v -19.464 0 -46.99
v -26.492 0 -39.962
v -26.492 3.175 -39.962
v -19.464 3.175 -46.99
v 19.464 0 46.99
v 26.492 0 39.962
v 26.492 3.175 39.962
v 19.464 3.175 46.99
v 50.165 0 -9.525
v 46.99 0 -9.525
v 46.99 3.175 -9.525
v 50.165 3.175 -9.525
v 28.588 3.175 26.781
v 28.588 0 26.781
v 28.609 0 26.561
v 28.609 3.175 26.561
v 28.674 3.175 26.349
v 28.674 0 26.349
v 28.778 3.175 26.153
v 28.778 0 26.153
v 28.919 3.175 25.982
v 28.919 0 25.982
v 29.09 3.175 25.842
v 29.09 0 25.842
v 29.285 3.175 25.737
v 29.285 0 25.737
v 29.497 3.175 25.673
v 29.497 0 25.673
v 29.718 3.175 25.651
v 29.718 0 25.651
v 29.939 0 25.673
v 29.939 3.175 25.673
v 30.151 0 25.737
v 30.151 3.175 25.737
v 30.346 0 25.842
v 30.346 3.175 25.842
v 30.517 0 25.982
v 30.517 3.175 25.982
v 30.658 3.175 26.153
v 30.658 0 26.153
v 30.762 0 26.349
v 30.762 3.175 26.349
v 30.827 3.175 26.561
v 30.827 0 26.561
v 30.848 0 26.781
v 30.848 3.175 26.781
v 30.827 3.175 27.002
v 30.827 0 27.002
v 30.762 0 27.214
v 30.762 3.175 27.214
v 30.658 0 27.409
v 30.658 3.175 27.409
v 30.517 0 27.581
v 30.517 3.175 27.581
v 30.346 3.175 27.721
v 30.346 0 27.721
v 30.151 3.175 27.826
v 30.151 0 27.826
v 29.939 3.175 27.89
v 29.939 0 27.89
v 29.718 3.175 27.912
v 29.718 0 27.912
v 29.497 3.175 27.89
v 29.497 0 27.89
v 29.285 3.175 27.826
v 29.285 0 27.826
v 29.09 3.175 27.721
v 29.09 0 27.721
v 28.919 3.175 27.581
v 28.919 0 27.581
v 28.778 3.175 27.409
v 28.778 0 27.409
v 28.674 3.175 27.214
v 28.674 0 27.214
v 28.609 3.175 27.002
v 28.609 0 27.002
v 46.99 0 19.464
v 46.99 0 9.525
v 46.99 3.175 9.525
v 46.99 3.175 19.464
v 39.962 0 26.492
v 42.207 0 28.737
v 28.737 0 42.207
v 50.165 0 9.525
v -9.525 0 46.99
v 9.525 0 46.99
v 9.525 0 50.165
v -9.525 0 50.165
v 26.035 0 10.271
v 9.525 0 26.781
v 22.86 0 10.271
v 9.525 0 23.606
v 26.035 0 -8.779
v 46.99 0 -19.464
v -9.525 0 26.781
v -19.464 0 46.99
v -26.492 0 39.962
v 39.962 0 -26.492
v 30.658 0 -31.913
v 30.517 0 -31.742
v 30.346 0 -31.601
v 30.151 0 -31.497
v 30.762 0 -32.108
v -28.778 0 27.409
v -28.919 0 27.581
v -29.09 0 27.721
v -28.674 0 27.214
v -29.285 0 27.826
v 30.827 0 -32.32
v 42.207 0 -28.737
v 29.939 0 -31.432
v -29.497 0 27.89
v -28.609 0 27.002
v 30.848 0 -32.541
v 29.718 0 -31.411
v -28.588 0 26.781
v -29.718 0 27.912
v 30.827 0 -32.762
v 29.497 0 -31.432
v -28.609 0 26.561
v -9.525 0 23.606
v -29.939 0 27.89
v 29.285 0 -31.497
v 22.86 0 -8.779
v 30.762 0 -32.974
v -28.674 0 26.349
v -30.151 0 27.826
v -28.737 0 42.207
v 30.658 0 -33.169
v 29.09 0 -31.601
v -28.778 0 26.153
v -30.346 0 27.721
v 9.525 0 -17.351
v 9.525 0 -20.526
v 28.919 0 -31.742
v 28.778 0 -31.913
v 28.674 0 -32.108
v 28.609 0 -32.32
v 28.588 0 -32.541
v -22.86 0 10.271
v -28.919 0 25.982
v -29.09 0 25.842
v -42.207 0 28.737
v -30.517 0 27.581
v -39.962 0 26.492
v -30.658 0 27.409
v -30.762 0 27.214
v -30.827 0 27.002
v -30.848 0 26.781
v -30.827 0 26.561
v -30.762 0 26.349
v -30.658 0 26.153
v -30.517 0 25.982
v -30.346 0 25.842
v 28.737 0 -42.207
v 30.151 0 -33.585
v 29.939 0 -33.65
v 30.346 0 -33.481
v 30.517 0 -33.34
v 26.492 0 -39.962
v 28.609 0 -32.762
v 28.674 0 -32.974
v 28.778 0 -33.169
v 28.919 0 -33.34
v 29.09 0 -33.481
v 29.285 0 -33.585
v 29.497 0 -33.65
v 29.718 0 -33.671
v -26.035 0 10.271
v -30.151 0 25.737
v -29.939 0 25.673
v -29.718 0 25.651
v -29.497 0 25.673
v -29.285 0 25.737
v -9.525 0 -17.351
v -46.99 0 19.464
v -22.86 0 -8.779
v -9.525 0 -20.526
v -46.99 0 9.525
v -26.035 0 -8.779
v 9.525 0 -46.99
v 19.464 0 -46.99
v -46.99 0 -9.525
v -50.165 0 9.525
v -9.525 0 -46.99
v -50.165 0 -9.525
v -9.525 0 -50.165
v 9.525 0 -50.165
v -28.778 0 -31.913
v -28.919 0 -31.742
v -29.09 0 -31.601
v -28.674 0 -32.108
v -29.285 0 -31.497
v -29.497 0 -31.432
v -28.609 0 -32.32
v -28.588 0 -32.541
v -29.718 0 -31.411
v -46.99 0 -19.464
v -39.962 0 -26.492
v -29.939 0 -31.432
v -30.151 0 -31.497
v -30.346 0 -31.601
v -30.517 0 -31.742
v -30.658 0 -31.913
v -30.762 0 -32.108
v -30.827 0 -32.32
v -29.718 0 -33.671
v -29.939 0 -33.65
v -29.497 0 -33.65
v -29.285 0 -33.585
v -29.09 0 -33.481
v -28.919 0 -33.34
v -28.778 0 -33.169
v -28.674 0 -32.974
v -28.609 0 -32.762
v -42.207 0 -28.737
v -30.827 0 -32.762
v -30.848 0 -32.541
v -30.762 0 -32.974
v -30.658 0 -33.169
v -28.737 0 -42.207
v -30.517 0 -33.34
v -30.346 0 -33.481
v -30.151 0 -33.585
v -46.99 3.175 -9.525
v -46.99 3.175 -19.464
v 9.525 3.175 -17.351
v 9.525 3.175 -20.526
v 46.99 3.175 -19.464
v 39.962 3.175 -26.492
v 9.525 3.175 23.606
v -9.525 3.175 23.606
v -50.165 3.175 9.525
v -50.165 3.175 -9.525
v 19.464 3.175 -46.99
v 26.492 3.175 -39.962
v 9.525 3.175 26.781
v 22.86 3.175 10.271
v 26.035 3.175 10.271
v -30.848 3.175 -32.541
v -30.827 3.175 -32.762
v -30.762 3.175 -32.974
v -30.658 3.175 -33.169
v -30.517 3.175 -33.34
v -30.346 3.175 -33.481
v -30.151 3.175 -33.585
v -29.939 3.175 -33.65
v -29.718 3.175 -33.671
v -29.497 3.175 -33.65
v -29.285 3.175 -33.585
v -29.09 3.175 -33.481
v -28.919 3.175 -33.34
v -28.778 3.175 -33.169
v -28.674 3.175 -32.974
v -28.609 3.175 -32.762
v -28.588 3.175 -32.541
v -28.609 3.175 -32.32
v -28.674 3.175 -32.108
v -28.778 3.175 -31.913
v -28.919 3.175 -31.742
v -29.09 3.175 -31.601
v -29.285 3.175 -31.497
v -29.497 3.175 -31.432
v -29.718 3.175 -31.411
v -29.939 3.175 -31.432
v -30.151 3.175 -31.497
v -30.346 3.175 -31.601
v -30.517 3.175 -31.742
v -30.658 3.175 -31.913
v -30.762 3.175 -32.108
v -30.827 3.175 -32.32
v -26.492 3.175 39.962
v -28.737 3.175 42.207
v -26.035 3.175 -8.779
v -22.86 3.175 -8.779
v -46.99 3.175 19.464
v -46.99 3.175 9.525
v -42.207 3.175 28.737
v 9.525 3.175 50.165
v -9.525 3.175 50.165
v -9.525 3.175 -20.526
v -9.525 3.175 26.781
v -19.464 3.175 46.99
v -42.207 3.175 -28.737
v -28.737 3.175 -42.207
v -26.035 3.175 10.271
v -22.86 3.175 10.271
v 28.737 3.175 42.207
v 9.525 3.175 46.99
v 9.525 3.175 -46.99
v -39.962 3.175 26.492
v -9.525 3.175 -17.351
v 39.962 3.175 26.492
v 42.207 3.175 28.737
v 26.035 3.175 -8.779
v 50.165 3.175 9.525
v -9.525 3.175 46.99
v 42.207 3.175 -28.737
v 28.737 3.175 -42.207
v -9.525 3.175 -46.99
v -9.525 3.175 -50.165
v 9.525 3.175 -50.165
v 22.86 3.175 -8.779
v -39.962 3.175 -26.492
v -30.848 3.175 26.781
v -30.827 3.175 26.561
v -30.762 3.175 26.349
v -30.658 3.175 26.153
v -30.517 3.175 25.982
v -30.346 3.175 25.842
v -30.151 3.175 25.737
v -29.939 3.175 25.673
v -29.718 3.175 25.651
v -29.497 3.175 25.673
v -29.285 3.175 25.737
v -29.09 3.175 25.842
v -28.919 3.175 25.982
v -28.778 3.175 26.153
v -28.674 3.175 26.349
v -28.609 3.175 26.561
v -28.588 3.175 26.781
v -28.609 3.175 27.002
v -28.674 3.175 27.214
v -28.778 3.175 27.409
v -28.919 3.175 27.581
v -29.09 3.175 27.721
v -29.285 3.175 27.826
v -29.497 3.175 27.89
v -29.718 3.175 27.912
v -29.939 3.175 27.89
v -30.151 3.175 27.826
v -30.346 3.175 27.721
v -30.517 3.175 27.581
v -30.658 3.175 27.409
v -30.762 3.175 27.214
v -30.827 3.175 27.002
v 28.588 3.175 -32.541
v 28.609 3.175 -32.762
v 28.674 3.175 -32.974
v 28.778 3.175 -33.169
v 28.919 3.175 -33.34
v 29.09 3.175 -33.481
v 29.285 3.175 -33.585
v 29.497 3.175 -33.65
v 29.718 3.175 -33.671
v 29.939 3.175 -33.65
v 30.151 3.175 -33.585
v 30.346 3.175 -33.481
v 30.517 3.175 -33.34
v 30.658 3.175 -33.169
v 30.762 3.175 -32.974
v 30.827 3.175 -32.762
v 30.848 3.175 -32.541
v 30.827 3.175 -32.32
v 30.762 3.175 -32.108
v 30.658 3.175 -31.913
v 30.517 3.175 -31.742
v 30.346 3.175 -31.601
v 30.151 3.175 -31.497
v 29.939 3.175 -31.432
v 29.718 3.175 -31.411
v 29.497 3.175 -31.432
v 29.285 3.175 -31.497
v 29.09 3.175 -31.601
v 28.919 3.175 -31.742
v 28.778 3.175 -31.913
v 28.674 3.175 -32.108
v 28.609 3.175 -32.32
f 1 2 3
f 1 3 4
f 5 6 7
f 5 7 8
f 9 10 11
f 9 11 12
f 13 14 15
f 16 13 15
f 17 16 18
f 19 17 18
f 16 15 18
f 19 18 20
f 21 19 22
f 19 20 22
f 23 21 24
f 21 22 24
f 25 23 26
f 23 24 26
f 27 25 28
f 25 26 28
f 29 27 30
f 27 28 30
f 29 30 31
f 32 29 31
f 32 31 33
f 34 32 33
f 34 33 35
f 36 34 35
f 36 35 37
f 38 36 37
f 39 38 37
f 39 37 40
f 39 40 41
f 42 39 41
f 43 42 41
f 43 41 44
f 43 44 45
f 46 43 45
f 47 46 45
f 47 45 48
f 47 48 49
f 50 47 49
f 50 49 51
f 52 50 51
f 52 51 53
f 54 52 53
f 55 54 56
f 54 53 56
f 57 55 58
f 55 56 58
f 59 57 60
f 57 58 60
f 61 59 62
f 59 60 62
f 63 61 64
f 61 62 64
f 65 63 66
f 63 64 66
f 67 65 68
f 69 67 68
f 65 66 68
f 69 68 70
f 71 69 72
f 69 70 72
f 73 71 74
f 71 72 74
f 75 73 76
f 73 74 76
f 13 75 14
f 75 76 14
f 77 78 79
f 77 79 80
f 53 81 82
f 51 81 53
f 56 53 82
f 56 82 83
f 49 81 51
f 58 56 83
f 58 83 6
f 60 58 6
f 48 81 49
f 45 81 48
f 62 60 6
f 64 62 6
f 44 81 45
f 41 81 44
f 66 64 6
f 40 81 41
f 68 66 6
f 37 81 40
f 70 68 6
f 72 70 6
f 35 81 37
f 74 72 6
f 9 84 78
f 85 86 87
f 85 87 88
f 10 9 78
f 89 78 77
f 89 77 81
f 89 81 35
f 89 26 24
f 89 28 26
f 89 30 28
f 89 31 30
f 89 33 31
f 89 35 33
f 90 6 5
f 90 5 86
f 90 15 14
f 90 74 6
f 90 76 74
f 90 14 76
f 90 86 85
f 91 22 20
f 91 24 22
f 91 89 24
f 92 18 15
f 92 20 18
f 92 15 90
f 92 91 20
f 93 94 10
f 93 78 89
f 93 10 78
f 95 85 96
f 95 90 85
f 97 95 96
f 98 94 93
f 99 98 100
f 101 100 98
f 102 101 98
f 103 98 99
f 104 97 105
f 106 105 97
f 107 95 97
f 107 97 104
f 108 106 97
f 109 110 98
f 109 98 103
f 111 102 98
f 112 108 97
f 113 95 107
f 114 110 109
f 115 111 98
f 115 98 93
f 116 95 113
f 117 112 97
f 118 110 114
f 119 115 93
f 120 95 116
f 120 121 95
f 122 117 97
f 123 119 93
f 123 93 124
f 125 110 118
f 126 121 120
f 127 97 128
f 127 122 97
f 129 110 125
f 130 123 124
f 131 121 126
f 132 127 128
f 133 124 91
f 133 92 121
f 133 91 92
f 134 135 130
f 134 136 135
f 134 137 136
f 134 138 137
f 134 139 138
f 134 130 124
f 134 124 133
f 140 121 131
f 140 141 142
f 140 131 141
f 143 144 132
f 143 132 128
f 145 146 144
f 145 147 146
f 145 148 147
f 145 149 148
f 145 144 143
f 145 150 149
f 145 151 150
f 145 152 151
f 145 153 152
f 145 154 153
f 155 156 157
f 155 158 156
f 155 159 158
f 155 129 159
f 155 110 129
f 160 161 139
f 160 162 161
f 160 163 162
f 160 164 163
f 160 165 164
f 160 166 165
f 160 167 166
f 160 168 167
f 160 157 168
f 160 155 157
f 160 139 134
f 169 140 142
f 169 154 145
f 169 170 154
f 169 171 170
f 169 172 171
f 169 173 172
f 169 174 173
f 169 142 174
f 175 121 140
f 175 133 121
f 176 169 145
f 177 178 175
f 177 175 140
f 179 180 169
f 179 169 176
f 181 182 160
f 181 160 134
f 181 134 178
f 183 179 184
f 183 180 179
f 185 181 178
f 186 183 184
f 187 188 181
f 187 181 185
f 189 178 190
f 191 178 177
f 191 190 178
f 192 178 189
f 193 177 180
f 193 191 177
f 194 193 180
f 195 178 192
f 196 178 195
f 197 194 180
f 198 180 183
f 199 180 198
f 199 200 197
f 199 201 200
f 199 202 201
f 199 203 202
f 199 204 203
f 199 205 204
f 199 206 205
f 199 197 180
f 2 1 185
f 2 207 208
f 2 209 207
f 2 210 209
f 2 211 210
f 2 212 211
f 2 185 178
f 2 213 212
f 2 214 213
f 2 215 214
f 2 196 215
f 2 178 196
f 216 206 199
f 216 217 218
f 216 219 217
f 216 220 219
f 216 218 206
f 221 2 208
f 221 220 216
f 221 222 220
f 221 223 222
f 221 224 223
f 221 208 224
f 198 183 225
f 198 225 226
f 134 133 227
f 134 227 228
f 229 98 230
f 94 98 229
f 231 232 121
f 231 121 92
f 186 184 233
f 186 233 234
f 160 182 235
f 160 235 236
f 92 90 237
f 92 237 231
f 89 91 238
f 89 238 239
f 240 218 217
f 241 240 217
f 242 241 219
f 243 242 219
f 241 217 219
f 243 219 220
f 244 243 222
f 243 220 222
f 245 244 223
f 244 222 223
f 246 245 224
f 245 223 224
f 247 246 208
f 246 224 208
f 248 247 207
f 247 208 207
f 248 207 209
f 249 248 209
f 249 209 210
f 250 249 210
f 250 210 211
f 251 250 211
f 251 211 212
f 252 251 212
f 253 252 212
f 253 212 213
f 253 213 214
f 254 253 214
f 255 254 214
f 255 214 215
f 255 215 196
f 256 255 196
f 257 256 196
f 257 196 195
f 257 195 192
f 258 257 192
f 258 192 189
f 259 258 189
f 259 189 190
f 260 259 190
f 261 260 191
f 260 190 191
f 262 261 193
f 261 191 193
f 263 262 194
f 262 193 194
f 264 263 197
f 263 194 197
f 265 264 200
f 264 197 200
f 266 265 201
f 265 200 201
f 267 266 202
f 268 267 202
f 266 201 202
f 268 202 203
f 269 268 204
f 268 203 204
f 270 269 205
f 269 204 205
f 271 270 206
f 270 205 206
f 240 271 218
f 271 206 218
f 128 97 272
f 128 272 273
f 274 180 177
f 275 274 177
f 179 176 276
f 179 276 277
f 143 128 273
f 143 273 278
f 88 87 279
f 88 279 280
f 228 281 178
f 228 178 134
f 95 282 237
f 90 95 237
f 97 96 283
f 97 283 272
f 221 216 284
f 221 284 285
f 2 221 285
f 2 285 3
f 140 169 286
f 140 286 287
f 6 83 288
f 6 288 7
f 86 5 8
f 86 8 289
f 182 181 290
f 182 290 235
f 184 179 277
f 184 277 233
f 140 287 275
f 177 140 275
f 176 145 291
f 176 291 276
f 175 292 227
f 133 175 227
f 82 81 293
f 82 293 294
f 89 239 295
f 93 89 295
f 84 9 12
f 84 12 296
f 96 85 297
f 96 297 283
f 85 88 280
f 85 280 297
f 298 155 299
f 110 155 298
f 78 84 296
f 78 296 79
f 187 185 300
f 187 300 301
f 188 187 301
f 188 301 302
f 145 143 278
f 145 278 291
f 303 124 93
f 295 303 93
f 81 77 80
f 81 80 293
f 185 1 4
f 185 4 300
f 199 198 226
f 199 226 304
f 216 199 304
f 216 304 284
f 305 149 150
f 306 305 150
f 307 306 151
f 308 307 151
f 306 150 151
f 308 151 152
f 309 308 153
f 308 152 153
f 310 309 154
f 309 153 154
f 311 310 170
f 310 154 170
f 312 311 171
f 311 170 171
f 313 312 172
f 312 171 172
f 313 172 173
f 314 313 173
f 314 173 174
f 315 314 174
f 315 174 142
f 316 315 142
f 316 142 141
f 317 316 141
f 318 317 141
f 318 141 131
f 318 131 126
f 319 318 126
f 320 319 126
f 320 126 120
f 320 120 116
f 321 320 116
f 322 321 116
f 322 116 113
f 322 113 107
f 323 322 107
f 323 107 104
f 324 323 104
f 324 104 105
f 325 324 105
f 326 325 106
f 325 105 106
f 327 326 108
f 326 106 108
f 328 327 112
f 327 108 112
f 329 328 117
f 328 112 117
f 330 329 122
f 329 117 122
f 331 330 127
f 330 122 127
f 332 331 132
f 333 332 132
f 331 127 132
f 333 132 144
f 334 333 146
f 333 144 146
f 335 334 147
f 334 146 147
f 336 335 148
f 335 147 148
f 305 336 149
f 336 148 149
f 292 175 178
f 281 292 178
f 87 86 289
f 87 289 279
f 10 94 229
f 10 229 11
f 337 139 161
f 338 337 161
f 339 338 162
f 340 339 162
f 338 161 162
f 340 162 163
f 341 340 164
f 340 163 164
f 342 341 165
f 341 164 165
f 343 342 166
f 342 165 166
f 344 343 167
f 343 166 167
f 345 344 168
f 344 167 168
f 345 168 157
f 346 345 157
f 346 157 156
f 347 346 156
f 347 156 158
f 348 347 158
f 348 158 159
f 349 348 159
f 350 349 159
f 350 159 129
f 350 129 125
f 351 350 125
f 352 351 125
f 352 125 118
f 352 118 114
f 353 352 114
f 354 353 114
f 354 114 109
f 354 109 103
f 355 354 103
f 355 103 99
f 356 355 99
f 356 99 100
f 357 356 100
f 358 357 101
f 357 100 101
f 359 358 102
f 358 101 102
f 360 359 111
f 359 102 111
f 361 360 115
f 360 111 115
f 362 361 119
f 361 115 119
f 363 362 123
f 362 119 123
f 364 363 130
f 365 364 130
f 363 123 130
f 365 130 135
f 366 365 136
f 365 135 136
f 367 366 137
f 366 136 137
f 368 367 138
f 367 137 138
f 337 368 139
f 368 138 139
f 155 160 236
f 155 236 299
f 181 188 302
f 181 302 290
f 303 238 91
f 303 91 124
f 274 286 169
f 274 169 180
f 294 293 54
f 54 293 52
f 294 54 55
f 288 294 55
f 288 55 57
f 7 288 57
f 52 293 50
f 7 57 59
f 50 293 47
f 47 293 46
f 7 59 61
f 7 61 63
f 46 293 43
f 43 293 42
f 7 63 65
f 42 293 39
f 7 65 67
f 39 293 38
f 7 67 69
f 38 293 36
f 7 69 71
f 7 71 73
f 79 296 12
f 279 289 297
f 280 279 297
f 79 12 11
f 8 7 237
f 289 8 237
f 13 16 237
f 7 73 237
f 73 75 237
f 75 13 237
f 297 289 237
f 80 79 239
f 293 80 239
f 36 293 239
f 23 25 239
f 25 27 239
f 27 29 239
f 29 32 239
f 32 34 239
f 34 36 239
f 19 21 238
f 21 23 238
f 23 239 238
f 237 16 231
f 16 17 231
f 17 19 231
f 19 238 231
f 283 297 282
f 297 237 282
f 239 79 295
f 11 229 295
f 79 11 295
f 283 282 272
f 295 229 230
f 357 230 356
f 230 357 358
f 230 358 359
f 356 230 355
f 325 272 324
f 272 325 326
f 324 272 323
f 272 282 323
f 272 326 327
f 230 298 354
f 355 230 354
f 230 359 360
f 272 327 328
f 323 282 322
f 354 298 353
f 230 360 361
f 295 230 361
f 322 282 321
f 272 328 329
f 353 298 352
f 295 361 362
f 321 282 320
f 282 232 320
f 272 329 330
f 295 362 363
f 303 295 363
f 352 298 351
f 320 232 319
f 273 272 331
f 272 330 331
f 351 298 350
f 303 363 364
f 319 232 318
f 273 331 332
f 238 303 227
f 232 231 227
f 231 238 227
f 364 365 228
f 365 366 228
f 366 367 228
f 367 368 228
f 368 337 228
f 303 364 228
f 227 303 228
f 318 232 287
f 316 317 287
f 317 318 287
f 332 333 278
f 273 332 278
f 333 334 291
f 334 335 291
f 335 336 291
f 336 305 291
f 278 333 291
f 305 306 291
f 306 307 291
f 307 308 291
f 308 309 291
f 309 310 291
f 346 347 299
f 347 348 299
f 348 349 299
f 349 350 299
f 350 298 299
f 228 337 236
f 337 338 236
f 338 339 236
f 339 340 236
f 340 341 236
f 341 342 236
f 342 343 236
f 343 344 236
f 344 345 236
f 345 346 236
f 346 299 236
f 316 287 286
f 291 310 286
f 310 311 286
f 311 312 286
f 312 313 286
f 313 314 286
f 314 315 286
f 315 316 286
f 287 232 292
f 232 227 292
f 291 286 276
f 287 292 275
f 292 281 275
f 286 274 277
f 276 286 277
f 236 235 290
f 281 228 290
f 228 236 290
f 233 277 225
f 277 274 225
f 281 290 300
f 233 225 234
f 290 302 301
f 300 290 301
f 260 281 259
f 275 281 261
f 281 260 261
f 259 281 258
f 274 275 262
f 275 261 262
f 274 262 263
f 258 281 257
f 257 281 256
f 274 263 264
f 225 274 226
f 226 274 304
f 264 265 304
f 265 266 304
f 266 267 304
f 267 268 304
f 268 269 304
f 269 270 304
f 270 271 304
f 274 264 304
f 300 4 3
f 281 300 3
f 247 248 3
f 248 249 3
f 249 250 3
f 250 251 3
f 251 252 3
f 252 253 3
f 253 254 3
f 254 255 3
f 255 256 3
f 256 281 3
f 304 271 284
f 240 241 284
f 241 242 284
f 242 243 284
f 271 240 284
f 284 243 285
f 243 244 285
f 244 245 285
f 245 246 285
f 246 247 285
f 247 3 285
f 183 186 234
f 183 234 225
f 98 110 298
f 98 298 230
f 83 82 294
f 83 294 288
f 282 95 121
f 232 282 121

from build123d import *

# Parameters (mm, degrees)
BOSS_EXTRUDE1_DEPTH   = 3.175
F_2_CLEARANCE_HOLE1_D = 2.2606
SKETCH4_W             = 3.175
SKETCH4_H             = 19.05
SKETCH4_W_2           = 19.05
SKETCH4_H_2           = 3.175
CUT_EXTRUDE1_DEPTH    = 72.01498393


with BuildPart() as part:
    # Sketch1 → Boss-Extrude1 (new body)
    with BuildSketch(Plane(origin=(0, 0, 0), x_dir=(1, 0, 0), z_dir=(0, 1, 0))):
        Polygon((-19.463895296, 46.99), (-9.525027315, 46.99), (-9.525027315, 50.165), (9.524972685, 50.165), (9.524972685, 46.990031352), (19.463840666, 46.990031352), (26.491681613, 39.962190405), (28.736745643, 42.207254435), (42.207129825, 28.736870254), (39.962087963, 26.491828392), (46.98992891, 19.463987446), (46.98992891, 9.525119465), (50.16492891, 9.525119465), (50.16492891, -9.524880535), (46.989960262, -9.524880535), (46.989960262, -19.463748516), (39.962119315, -26.491589463), (42.207183345, -28.736653493), (28.736799164, -42.207037675), (26.491757302, -39.961995814), (19.463916356, -46.98983676), (9.525048375, -46.98983676), (9.525048375, -50.16483676), (-9.524951625, -50.16483676), (-9.524951625, -46.989868112), (-19.463819606, -46.989868112), (-26.491660553, -39.962027165), (-28.736724583, -42.207091196), (-42.207108765, -28.736707014), (-39.962066904, -26.491665153), (-46.98990785, -19.463824206), (-46.98990785, -9.524956225), (-50.16490785, -9.524956225), (-50.16490785, 9.525043775), (-46.989939202, 9.525043775), (-46.989939202, 19.463911756), (-39.962098255, 26.491752703), (-42.207162286, 28.736816733), (-28.736778104, 42.207200915), (-26.491736243, 39.962159053), align=None)
    extrude(amount=BOSS_EXTRUDE1_DEPTH)

    # #2 Clearance Hole1 (through all)
    with Locations(Plane(origin=(0, 3.175, 0), x_dir=(1, 0, 0), z_dir=(0, 1, 0))):
        with Locations((-29.718, -26.781346139), (-29.718, 32.541008543), (29.718, 32.541008543), (29.718, -26.781346139)):
            Hole(F_2_CLEARANCE_HOLE1_D / 2)

    # Sketch4 → Cut-Extrude1 (cut, through all)
    with BuildSketch(Plane(origin=(0, 3.175, 0), x_dir=(1, 0, 0), z_dir=(0, 1, 0))):
        with Locations((-24.4475, -0.746346139)):
            Rectangle(SKETCH4_W, SKETCH4_H)
        with Locations((24.4475, -0.746346139)):
            Rectangle(SKETCH4_W, SKETCH4_H)
        with Locations((0, 18.938653861)):
            Rectangle(SKETCH4_W_2, SKETCH4_H_2)
        with Locations((0, -25.193846139)):
            Rectangle(SKETCH4_W_2, SKETCH4_H_2)
    extrude(amount=-CUT_EXTRUDE1_DEPTH, mode=Mode.SUBTRACT)


solid = part.part
